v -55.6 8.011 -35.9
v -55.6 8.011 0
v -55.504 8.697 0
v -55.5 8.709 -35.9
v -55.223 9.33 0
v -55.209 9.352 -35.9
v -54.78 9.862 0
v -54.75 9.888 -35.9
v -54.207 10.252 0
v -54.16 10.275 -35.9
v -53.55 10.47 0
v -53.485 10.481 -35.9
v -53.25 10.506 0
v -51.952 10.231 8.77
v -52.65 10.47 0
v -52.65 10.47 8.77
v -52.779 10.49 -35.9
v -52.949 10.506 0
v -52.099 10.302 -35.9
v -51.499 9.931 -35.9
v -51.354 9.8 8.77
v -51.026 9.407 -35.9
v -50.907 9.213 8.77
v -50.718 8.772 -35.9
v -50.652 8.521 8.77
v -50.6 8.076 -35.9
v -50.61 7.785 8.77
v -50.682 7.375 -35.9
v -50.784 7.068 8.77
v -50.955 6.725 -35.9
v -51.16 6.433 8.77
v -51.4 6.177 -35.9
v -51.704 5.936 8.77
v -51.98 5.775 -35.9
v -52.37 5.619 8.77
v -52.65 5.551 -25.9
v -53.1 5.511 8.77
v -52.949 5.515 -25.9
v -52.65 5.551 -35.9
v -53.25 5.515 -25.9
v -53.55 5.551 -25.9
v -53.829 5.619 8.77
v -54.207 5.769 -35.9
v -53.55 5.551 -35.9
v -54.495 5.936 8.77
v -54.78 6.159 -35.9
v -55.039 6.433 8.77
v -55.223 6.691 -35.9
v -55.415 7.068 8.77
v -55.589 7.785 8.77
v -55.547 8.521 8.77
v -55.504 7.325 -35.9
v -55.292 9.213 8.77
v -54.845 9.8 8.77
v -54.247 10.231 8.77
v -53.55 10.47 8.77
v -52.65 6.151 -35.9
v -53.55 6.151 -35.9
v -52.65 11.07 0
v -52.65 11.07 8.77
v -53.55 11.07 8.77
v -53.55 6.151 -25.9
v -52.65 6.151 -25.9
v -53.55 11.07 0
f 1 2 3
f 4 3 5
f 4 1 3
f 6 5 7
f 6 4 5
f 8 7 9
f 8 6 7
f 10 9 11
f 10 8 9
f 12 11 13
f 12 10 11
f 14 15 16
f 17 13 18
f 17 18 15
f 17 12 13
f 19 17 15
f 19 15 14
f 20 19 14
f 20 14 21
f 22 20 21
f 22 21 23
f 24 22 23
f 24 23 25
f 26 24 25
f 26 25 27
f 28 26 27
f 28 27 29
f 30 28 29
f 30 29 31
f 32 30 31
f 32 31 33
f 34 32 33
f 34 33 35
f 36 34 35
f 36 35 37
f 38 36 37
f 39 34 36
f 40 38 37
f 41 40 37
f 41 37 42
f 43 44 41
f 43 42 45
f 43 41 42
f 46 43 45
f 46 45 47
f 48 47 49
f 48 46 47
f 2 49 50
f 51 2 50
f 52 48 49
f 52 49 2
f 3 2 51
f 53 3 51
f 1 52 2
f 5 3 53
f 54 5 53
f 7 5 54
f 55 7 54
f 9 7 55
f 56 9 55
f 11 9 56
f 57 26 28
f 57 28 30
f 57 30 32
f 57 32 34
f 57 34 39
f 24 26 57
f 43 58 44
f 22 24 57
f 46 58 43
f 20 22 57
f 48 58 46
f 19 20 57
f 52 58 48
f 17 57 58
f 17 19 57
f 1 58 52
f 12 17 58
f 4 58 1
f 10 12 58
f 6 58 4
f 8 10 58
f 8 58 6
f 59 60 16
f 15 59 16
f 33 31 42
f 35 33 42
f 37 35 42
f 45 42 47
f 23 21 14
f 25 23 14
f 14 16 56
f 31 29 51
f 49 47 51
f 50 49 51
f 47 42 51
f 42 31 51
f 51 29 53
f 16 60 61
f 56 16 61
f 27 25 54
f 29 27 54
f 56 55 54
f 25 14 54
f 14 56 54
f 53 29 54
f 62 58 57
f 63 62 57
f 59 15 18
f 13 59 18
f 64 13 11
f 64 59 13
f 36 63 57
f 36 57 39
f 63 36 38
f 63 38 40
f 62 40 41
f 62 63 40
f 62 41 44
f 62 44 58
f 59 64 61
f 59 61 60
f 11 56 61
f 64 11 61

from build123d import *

# Parameters (mm, degrees)
SALIENTE_EXTRUIR1_DEPTH = 8.77
SALIENTE_EXTRUIR2_START = 25.9
CROQUIS2_R              = 2.5
SALIENTE_EXTRUIR2_DEPTH = 25.9
SALIENTE_EXTRUIR6_START = 10
CROQUIS3_R              = 2.5
SALIENTE_EXTRUIR6_DEPTH = 10
CORTAR_EXTRUIR1_DEPTH   = 10


with BuildPart() as part:
    # Croquis1 → Saliente-Extruir1 (new body)
    with BuildSketch(Plane.XY):
        with BuildLine():
            Line((-53.549500652, 10.469715541), (-53.549500652, 11.069715541))
            Line((-53.549500652, 11.069715541), (-52.649500652, 11.069715541))
            Line((-52.649500652, 11.069715541), (-52.649500652, 10.469715541))
            ThreePointArc((-52.649500652, 10.469715541), (-53.099500652, 5.510549015), (-53.549500652, 10.469715541))
        make_face()
    extrude(amount=SALIENTE_EXTRUIR1_DEPTH)

    # Croquis2 → Saliente-Extruir2 (add)
    with BuildSketch(Plane(origin=(0, 0, 0), x_dir=(-1, 0, 0), z_dir=(0, 0, -1)).offset(SALIENTE_EXTRUIR2_START)):
        with Locations((53.099500652, 8.010549015)):
            Circle(CROQUIS2_R)
    extrude(amount=-SALIENTE_EXTRUIR2_DEPTH)

    # Croquis3 → Saliente-Extruir6 (add)
    with BuildSketch(Plane(origin=(0, 0, -25.9), x_dir=(-1, 0, 0), z_dir=(0, 0, -1)).offset(SALIENTE_EXTRUIR6_START)):
        with Locations((53.099500652, 8.010549015)):
            Circle(CROQUIS3_R)
    extrude(amount=-SALIENTE_EXTRUIR6_DEPTH)

    # Croquis8 → Cortar-Extruir1 (cut)
    with BuildSketch(Plane(origin=(0, 0, -35.9), x_dir=(-1, 0, 0), z_dir=(0, 0, -1))):
        with BuildLine():
            Line((52.649500652, 6.15138249), (52.649500652, 5.55138249))
            ThreePointArc((52.649500652, 5.55138249), (53.099500652, 5.510549014), (53.549500652, 5.55138249))
            Line((53.549500652, 5.55138249), (53.549500652, 6.15138249))
            Line((53.549500652, 6.15138249), (52.649500652, 6.15138249))
        make_face()
    extrude(amount=-CORTAR_EXTRUIR1_DEPTH, mode=Mode.SUBTRACT)


solid = part.part
